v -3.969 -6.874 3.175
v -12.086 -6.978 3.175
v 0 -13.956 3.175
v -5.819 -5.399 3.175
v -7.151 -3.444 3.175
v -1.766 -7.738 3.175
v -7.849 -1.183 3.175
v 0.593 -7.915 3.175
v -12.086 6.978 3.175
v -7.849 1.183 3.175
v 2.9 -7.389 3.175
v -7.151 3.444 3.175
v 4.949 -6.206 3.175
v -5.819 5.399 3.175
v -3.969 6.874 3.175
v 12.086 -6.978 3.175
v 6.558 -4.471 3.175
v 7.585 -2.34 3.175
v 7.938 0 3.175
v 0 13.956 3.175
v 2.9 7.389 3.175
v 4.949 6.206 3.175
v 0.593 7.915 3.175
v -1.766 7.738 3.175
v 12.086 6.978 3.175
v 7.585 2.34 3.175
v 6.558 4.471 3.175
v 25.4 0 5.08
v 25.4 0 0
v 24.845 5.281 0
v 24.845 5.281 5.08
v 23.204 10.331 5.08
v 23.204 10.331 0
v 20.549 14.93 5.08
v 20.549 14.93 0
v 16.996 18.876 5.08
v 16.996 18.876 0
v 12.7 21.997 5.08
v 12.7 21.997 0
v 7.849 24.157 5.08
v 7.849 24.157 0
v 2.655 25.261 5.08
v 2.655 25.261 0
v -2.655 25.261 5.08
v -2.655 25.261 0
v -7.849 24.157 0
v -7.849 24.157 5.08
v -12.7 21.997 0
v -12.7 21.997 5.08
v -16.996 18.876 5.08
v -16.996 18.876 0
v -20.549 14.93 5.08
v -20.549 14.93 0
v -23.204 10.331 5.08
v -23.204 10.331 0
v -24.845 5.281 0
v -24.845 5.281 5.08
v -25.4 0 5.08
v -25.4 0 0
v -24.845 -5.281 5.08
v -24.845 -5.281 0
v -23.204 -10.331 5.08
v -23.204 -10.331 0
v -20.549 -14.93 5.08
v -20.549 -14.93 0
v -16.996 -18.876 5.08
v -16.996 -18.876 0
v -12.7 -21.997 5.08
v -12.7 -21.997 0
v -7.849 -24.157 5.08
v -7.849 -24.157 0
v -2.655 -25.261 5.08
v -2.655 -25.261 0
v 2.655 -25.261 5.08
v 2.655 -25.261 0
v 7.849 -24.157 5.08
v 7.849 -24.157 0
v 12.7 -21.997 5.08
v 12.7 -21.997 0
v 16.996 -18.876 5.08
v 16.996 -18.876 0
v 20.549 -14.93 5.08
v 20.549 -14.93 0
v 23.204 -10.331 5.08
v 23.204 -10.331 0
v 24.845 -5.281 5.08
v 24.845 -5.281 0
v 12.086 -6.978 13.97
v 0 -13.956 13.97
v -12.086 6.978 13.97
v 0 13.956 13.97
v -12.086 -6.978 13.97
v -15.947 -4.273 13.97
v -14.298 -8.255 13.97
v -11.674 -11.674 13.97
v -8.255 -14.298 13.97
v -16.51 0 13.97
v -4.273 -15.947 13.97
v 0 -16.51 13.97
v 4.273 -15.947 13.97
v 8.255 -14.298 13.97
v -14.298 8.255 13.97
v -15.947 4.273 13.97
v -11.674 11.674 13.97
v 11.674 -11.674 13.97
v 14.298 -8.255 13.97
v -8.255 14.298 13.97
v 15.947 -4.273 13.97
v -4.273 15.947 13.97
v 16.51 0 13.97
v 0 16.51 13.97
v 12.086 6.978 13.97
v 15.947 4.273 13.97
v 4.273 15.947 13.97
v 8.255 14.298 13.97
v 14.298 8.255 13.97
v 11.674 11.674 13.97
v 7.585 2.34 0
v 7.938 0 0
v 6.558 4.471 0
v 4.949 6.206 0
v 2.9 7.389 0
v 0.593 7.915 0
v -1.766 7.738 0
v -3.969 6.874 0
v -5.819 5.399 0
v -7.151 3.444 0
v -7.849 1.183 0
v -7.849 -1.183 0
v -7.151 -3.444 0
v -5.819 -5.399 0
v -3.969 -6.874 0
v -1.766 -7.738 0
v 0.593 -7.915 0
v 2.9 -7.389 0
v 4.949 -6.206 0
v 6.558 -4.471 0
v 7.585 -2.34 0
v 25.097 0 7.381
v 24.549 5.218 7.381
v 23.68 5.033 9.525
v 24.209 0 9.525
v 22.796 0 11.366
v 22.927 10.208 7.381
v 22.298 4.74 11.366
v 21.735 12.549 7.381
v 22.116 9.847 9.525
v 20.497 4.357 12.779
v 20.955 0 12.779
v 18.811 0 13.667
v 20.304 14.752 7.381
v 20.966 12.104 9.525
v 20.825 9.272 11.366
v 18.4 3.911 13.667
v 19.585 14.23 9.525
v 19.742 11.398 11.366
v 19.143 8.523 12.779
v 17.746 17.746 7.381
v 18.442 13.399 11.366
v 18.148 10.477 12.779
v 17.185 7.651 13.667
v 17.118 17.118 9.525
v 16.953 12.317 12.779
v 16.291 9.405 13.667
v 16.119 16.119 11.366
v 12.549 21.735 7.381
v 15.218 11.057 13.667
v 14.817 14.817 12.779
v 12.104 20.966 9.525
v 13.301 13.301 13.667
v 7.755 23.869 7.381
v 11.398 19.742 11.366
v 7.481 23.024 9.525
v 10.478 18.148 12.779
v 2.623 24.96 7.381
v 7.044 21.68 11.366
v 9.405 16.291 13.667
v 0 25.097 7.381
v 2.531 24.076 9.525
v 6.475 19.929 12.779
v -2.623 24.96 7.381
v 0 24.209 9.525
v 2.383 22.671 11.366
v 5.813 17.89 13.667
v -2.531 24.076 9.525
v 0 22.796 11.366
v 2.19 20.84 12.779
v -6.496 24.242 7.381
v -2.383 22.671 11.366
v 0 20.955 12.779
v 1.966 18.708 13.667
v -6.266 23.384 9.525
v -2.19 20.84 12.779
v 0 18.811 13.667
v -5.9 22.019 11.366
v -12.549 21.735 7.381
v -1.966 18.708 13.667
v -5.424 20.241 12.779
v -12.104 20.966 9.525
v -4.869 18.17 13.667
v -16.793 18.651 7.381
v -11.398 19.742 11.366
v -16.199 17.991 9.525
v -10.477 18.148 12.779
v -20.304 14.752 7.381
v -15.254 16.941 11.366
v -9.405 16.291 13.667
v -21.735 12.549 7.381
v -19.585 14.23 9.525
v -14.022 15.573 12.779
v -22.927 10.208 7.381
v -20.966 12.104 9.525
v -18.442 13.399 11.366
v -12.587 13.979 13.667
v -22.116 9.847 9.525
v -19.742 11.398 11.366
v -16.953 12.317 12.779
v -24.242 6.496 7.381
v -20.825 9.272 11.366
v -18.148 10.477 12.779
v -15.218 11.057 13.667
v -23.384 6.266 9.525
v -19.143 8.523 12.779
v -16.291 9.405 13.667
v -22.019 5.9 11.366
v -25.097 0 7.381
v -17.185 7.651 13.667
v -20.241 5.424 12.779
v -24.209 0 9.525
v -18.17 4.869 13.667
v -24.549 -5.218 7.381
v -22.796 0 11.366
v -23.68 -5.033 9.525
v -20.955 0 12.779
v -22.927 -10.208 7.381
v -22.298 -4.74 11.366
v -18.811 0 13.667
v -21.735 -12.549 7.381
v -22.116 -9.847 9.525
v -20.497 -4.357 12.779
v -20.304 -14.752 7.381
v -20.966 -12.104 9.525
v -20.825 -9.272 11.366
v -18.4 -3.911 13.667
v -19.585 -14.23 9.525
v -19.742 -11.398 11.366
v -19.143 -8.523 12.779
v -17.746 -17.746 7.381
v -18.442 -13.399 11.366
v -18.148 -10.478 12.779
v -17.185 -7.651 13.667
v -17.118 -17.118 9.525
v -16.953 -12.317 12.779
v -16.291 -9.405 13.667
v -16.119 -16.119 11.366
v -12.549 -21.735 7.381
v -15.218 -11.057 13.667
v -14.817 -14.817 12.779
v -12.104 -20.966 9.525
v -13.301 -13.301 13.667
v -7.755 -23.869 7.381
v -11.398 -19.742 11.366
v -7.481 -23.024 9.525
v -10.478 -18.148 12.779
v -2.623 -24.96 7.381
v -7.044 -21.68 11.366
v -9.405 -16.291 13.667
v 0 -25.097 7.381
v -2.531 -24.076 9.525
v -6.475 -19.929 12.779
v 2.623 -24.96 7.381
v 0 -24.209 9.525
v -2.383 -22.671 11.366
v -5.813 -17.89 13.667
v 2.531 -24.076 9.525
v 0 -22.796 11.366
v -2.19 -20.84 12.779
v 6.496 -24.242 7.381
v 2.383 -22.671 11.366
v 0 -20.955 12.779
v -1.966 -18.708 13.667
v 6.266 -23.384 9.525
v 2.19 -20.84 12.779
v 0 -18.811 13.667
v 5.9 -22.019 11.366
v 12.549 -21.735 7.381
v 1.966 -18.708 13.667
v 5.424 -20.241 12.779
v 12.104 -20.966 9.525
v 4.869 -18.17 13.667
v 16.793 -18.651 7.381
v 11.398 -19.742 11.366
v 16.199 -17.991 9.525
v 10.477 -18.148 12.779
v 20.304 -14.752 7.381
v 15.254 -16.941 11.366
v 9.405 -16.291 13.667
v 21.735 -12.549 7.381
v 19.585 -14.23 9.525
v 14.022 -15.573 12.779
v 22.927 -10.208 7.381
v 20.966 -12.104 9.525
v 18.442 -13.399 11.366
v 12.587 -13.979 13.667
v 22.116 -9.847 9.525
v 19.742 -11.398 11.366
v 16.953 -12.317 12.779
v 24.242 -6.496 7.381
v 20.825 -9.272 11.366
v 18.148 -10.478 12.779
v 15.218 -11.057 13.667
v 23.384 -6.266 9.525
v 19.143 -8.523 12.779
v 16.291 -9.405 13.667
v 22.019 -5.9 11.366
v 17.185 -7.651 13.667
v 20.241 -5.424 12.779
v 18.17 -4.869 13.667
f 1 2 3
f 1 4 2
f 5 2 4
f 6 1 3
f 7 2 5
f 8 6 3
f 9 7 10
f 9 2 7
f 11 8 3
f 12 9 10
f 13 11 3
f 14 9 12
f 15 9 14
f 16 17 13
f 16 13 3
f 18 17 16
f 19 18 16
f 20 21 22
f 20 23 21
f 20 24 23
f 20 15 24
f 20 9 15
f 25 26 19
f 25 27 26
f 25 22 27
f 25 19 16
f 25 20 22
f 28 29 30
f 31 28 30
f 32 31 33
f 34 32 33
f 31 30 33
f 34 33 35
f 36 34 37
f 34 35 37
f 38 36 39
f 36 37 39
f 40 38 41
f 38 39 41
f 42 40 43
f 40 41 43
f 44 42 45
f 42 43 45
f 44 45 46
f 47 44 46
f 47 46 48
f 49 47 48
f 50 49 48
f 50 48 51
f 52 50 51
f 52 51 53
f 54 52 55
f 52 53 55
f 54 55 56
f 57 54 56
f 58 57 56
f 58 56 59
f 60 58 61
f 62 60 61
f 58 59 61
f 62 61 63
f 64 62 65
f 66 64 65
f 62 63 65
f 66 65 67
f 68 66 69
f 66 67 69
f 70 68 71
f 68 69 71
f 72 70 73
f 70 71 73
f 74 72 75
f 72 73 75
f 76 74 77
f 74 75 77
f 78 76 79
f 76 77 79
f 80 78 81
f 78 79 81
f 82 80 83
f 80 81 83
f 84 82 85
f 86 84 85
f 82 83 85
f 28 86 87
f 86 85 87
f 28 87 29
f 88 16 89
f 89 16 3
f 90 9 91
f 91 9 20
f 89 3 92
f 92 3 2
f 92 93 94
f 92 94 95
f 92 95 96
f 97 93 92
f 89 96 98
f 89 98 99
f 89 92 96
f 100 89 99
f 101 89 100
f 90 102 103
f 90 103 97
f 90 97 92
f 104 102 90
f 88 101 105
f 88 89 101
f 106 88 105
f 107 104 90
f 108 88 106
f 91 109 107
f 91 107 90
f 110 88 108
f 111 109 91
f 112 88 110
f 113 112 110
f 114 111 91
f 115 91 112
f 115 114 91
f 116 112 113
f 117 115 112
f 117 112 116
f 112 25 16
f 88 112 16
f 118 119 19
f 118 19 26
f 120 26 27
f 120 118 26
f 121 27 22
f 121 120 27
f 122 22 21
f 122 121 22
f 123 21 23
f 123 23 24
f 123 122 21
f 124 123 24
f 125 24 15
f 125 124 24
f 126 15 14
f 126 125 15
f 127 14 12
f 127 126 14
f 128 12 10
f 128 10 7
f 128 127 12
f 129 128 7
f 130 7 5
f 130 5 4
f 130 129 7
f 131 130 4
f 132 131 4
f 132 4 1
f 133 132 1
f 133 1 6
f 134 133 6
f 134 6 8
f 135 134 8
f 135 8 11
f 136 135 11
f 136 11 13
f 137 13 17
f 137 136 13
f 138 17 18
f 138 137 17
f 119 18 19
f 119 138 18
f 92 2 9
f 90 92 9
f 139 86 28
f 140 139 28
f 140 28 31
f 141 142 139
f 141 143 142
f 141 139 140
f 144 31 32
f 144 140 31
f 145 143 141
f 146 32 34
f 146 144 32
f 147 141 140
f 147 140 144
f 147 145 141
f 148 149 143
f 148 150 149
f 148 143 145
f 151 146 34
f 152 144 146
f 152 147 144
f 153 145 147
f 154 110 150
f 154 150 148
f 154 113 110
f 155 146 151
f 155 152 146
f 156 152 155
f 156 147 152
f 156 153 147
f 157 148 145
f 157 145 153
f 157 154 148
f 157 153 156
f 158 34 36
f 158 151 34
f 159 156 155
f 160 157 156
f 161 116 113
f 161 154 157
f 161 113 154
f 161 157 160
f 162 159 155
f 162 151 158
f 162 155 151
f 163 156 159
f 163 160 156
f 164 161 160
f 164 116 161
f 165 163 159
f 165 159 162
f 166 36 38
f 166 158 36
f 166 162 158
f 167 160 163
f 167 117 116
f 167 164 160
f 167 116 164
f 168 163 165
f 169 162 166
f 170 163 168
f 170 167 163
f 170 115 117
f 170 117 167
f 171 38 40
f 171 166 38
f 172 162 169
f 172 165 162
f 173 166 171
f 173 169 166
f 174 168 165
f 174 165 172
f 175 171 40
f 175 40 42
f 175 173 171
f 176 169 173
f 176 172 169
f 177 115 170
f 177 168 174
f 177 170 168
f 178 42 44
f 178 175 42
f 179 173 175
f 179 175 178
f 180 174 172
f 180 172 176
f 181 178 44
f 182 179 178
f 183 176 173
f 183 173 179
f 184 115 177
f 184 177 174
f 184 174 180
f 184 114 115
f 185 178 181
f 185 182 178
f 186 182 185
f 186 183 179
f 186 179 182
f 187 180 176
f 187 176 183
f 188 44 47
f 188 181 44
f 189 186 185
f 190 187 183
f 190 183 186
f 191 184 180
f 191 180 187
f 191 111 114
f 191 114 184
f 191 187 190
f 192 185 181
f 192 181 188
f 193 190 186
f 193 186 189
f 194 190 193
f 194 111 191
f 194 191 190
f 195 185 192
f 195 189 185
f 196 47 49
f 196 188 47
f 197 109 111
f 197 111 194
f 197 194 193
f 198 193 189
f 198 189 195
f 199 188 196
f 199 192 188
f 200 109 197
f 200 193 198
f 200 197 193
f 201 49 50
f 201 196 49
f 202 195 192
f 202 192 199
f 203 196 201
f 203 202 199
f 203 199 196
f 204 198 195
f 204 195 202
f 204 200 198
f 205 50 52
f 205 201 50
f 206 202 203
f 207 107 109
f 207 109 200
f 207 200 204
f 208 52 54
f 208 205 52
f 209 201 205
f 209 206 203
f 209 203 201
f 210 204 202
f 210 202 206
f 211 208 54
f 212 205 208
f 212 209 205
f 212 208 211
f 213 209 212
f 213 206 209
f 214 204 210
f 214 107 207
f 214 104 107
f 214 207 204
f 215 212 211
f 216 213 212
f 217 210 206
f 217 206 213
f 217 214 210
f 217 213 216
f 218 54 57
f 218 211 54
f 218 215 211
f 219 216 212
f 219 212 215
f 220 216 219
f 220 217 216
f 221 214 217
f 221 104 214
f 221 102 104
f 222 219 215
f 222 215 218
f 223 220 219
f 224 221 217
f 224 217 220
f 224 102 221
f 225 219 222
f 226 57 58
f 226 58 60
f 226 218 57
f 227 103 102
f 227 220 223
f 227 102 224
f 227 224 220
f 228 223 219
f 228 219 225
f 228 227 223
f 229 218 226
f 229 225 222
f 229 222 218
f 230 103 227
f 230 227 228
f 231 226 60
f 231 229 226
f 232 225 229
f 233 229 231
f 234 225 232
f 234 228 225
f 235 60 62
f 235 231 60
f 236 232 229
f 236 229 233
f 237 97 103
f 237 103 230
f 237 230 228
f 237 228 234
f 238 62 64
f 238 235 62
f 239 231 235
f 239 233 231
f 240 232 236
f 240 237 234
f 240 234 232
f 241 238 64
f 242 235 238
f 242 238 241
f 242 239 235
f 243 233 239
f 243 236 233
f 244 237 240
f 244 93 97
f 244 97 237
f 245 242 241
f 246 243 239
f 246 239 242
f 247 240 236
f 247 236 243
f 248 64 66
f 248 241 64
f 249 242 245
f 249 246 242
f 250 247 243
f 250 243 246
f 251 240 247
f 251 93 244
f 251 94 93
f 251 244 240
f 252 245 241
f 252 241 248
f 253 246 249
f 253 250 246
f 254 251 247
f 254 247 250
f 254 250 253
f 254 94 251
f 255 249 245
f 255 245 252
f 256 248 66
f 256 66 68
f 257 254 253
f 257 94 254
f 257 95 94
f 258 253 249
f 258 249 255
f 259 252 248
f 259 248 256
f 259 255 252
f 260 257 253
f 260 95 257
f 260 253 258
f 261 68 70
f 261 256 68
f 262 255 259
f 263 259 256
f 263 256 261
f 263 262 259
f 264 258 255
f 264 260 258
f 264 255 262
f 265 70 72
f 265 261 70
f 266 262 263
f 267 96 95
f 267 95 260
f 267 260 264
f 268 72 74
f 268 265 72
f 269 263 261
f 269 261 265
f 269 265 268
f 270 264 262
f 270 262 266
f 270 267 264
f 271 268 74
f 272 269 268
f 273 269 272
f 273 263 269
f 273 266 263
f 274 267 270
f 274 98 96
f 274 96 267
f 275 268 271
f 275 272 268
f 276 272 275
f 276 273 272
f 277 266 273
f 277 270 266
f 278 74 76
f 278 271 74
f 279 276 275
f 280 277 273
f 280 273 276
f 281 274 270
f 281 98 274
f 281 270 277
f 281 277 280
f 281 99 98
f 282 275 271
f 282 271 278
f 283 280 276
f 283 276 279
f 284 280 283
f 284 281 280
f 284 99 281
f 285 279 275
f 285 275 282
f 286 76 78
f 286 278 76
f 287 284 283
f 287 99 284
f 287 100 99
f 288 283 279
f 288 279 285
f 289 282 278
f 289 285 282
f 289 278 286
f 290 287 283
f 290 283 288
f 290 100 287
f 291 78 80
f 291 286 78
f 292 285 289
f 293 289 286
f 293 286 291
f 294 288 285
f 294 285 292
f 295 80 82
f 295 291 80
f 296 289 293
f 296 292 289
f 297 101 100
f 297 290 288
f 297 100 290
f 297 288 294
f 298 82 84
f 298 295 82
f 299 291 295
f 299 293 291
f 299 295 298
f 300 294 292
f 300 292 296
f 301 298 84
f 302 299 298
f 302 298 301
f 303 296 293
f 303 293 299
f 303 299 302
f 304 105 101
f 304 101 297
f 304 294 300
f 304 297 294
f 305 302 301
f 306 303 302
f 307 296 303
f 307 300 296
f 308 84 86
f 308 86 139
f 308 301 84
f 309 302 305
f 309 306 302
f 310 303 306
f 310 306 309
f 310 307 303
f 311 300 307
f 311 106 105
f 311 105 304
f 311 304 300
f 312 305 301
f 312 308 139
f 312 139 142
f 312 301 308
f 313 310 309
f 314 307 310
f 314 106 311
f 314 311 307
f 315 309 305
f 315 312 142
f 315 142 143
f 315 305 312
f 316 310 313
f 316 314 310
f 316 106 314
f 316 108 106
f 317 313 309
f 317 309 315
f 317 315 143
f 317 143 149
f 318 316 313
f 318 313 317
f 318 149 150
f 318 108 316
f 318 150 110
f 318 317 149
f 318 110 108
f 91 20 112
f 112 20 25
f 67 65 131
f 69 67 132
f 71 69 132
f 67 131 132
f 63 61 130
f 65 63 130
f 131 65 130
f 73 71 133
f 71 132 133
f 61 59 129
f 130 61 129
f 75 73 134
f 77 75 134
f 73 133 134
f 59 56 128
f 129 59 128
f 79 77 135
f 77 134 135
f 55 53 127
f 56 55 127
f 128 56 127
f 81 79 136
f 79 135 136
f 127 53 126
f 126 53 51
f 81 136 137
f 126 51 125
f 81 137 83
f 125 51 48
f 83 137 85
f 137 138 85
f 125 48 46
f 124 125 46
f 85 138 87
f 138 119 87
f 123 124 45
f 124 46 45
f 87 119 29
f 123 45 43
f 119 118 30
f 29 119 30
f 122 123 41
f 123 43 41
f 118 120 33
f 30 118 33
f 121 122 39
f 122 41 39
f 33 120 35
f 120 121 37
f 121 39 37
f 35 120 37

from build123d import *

# Parameters (mm, degrees)
F0_R     = 25.4
F1_DEPTH = 13.97
F0_R_2   = 7.9375
F2_DEPTH = 3.175
F3_R     = 8.89


with BuildPart() as f1:
    # F0 (on Top) → F1 (new body)
    with BuildSketch(Plane.XY):
        Circle(F0_R)
        Polygon((0, 13.956173), (12.0864, 6.978086), (12.0864, -6.978086), (0, -13.956173), (-12.0864, -6.978086), (-12.0864, 6.978086), align=None, mode=Mode.SUBTRACT)
    extrude(amount=F1_DEPTH)

    # F0 (on Top) → F2 (join)
    with BuildSketch(Plane.XY):
        Polygon((12.0864, -6.978086), (12.0864, 6.978086), (0, 13.956173), (-12.0864, 6.978086), (-12.0864, -6.978086), (0, -13.956173), align=None)
        Circle(F0_R_2, mode=Mode.SUBTRACT)
    extrude(amount=F2_DEPTH)

    # F3
    f3_edges = [f1.edges().sort_by_distance(p)[0] for p in [
        (-25.4, 0, 13.97),
    ]]
    fillet(f3_edges, radius=F3_R)


solid = f1.part
